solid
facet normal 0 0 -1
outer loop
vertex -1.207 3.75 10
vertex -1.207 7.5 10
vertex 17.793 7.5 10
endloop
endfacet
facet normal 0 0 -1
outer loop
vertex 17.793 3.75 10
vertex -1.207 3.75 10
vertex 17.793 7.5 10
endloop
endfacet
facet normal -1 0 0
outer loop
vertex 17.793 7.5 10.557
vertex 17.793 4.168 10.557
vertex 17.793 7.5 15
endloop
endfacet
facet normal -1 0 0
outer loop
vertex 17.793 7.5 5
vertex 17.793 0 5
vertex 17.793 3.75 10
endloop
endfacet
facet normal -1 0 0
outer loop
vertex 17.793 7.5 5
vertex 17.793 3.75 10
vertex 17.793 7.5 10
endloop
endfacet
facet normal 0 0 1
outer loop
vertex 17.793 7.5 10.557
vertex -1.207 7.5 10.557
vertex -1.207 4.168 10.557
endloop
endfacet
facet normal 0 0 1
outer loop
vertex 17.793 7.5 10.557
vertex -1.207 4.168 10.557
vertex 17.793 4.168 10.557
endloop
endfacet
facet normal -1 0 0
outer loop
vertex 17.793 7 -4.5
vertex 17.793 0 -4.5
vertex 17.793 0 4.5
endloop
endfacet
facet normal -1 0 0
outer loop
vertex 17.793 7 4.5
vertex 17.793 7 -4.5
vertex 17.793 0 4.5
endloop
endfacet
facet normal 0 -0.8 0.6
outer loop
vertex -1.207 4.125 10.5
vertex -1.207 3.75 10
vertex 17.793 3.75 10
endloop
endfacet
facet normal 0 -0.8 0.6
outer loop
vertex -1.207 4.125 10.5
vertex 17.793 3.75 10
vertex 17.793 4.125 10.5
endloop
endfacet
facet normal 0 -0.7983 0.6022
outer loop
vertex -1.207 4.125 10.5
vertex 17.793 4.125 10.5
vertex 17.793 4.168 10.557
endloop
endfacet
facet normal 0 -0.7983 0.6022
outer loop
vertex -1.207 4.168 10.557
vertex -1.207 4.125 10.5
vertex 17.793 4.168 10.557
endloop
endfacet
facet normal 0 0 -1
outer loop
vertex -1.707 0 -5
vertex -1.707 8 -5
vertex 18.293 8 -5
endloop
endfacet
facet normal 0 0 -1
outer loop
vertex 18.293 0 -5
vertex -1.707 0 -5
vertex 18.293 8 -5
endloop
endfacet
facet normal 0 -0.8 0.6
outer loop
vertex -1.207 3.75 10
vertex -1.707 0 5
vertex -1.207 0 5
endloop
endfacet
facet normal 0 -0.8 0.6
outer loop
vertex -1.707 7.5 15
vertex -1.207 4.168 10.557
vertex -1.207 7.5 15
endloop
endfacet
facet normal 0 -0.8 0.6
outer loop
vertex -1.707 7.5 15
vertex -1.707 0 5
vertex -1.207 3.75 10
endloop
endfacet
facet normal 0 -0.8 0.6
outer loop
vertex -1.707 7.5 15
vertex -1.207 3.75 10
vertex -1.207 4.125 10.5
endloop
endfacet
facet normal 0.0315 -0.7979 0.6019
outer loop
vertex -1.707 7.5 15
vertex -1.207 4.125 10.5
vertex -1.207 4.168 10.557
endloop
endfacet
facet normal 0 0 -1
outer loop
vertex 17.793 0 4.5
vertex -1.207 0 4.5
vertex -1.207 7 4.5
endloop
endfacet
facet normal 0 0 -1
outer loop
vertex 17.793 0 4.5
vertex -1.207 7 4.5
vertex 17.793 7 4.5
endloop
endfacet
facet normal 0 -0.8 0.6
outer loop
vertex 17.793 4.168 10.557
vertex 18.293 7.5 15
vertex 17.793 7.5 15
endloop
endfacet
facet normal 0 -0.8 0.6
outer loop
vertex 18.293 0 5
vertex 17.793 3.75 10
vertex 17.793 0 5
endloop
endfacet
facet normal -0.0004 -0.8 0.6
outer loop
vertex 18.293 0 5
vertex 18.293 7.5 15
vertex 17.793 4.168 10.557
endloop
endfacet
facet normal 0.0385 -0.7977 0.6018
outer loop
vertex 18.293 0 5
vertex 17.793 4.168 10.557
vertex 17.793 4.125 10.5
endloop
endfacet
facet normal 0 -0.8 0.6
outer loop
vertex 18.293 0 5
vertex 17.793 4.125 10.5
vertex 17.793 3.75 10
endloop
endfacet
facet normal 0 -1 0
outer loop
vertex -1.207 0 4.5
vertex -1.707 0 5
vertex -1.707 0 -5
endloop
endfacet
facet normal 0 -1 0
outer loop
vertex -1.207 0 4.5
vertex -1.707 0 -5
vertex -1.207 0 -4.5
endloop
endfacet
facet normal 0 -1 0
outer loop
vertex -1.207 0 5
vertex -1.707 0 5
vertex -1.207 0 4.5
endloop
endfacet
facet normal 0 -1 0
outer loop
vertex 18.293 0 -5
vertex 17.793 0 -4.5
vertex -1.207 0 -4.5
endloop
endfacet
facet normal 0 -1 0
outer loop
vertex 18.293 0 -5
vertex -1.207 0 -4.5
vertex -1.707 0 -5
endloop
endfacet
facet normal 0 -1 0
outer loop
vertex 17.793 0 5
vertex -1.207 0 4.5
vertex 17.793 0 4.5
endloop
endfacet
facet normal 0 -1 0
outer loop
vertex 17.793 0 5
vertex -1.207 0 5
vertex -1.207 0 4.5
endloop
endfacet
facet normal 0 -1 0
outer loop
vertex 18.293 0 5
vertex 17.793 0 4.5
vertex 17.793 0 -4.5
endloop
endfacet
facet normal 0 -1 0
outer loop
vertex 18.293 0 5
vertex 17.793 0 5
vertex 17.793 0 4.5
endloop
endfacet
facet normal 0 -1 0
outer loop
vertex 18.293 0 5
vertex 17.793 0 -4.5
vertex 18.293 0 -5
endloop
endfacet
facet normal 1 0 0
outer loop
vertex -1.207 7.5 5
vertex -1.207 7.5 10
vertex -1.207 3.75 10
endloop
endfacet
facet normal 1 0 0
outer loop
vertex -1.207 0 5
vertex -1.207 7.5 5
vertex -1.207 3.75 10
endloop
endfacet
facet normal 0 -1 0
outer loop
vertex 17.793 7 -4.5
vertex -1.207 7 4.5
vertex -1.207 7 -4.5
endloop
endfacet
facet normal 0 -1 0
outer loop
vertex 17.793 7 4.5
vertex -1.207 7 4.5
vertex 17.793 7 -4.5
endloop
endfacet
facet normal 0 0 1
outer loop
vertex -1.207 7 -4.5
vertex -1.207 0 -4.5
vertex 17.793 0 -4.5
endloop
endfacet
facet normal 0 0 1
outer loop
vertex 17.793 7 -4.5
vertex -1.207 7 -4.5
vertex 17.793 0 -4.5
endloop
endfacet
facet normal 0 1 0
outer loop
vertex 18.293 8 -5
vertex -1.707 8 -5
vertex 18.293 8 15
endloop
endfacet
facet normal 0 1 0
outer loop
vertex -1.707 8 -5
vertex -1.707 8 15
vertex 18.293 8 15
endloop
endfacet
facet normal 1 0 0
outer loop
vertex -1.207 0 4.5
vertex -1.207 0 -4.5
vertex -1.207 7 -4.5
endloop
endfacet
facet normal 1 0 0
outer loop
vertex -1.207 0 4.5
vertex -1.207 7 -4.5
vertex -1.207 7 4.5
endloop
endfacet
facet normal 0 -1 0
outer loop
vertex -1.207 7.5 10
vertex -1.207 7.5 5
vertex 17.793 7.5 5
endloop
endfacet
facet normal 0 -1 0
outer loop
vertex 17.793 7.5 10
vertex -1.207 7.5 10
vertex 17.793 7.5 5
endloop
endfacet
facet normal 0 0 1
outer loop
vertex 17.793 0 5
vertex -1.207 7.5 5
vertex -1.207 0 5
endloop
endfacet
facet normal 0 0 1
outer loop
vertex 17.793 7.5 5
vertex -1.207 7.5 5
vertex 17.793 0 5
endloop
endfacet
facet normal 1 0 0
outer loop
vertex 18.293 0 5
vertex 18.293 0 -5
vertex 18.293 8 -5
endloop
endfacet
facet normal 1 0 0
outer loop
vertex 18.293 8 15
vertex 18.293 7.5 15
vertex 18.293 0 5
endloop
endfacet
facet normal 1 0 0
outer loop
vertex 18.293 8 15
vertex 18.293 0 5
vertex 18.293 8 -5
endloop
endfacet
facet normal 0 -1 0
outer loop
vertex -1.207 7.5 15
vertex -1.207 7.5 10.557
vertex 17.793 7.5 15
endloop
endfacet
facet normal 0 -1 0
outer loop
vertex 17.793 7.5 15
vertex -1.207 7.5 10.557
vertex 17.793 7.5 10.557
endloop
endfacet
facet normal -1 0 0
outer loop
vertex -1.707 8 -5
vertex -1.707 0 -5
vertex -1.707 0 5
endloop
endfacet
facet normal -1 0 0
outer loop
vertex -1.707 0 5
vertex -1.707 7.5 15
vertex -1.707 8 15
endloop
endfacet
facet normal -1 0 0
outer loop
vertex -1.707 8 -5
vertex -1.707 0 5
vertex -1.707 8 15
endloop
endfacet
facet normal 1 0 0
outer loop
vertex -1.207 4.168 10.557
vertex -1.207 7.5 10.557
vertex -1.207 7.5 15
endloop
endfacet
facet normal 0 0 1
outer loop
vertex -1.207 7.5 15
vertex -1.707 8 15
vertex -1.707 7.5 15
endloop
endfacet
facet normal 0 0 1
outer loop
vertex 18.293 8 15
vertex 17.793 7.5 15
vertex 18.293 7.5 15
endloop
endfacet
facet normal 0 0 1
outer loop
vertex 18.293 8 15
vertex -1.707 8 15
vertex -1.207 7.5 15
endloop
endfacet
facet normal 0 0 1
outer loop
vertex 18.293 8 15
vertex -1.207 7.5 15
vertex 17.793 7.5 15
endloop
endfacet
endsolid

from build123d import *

# Parameters (mm, degrees)
F0_W      = 20
F0_H      = 8
F1_DEPTH  = 5
F2_W      = 20
F2_H      = 0.5
F3_DEPTH  = 10
F5_DEPTH  = 0.5
F7_DEPTH  = 0.5
F8_DEPTH  = 5
F11_W     = 19
F11_H     = 0.5570442975
F12_DEPTH = 4
F14_DEPTH = 25
F15_W     = 19
F15_H     = 9
F16_DEPTH = 7


# Not quite as in the source:
# - a feature of the source that left no trace in its solid (it failed there, or was rolled back) is left out


with BuildPart() as f1:
    # F0 (on Top) → F1 (new body)
    with BuildSketch(Plane.XY):
        with Locations((8.2929818355, 4)):
            Rectangle(F0_W, F0_H)
    extrude(amount=F1_DEPTH)

    # F2 (on face) → F3 (join)
    with BuildSketch(Plane.XY.offset(5)):
        with Locations((8.2929818355, 7.75)):
            Rectangle(F2_W, F2_H)
    extrude(amount=F3_DEPTH)

    # F4 (on face) → F5 (join)
    with BuildSketch(Plane(origin=(-1.7070181645, 0, 0), x_dir=(0, -1, 0), z_dir=(-1, 0, 0))):
        Polygon((-7.5, 5), (0, 5), (-7.5, 15), align=None)
    extrude(amount=-F5_DEPTH)

    # F6 (on face) → F7 (join)
    with BuildSketch(Plane.YZ.offset(18.2929818355)):
        Polygon((7.5, 5), (7.5, 15), (0, 5), align=None)
    extrude(amount=-F7_DEPTH)

    # F8 (add): a face of the model
    f8_faces = [f1.faces().sort_by_distance(p)[0] for p in [
        (8.2929818355, 4, 0),
    ]]
    extrude(f8_faces, amount=F8_DEPTH)

    # F11 (on face) → F12 (join)
    with BuildSketch(Plane.XZ.offset(-7.5)):
        with Locations((8.2929818355, 10.2785221487)):
            Rectangle(F11_W, F11_H)
    extrude(amount=F12_DEPTH)

    # F13 (on face) → F14 (cut)
    with BuildSketch(Plane.YZ.offset(17.7929818355)):
        Polygon((3.75, 10), (4.1247227065, 10.4996302754), (4.1677832231, 10.5570442975), (3.5, 10.5570442975), (3.5, 10), align=None)
    extrude(amount=-F14_DEPTH, mode=Mode.SUBTRACT)

    # F15 (on face) → F16 (cut)
    with BuildSketch(Plane.XZ):
        with Locations((8.2929818355, 0)):
            Rectangle(F15_W, F15_H)
    extrude(amount=-F16_DEPTH, mode=Mode.SUBTRACT)


solid = f1.part
